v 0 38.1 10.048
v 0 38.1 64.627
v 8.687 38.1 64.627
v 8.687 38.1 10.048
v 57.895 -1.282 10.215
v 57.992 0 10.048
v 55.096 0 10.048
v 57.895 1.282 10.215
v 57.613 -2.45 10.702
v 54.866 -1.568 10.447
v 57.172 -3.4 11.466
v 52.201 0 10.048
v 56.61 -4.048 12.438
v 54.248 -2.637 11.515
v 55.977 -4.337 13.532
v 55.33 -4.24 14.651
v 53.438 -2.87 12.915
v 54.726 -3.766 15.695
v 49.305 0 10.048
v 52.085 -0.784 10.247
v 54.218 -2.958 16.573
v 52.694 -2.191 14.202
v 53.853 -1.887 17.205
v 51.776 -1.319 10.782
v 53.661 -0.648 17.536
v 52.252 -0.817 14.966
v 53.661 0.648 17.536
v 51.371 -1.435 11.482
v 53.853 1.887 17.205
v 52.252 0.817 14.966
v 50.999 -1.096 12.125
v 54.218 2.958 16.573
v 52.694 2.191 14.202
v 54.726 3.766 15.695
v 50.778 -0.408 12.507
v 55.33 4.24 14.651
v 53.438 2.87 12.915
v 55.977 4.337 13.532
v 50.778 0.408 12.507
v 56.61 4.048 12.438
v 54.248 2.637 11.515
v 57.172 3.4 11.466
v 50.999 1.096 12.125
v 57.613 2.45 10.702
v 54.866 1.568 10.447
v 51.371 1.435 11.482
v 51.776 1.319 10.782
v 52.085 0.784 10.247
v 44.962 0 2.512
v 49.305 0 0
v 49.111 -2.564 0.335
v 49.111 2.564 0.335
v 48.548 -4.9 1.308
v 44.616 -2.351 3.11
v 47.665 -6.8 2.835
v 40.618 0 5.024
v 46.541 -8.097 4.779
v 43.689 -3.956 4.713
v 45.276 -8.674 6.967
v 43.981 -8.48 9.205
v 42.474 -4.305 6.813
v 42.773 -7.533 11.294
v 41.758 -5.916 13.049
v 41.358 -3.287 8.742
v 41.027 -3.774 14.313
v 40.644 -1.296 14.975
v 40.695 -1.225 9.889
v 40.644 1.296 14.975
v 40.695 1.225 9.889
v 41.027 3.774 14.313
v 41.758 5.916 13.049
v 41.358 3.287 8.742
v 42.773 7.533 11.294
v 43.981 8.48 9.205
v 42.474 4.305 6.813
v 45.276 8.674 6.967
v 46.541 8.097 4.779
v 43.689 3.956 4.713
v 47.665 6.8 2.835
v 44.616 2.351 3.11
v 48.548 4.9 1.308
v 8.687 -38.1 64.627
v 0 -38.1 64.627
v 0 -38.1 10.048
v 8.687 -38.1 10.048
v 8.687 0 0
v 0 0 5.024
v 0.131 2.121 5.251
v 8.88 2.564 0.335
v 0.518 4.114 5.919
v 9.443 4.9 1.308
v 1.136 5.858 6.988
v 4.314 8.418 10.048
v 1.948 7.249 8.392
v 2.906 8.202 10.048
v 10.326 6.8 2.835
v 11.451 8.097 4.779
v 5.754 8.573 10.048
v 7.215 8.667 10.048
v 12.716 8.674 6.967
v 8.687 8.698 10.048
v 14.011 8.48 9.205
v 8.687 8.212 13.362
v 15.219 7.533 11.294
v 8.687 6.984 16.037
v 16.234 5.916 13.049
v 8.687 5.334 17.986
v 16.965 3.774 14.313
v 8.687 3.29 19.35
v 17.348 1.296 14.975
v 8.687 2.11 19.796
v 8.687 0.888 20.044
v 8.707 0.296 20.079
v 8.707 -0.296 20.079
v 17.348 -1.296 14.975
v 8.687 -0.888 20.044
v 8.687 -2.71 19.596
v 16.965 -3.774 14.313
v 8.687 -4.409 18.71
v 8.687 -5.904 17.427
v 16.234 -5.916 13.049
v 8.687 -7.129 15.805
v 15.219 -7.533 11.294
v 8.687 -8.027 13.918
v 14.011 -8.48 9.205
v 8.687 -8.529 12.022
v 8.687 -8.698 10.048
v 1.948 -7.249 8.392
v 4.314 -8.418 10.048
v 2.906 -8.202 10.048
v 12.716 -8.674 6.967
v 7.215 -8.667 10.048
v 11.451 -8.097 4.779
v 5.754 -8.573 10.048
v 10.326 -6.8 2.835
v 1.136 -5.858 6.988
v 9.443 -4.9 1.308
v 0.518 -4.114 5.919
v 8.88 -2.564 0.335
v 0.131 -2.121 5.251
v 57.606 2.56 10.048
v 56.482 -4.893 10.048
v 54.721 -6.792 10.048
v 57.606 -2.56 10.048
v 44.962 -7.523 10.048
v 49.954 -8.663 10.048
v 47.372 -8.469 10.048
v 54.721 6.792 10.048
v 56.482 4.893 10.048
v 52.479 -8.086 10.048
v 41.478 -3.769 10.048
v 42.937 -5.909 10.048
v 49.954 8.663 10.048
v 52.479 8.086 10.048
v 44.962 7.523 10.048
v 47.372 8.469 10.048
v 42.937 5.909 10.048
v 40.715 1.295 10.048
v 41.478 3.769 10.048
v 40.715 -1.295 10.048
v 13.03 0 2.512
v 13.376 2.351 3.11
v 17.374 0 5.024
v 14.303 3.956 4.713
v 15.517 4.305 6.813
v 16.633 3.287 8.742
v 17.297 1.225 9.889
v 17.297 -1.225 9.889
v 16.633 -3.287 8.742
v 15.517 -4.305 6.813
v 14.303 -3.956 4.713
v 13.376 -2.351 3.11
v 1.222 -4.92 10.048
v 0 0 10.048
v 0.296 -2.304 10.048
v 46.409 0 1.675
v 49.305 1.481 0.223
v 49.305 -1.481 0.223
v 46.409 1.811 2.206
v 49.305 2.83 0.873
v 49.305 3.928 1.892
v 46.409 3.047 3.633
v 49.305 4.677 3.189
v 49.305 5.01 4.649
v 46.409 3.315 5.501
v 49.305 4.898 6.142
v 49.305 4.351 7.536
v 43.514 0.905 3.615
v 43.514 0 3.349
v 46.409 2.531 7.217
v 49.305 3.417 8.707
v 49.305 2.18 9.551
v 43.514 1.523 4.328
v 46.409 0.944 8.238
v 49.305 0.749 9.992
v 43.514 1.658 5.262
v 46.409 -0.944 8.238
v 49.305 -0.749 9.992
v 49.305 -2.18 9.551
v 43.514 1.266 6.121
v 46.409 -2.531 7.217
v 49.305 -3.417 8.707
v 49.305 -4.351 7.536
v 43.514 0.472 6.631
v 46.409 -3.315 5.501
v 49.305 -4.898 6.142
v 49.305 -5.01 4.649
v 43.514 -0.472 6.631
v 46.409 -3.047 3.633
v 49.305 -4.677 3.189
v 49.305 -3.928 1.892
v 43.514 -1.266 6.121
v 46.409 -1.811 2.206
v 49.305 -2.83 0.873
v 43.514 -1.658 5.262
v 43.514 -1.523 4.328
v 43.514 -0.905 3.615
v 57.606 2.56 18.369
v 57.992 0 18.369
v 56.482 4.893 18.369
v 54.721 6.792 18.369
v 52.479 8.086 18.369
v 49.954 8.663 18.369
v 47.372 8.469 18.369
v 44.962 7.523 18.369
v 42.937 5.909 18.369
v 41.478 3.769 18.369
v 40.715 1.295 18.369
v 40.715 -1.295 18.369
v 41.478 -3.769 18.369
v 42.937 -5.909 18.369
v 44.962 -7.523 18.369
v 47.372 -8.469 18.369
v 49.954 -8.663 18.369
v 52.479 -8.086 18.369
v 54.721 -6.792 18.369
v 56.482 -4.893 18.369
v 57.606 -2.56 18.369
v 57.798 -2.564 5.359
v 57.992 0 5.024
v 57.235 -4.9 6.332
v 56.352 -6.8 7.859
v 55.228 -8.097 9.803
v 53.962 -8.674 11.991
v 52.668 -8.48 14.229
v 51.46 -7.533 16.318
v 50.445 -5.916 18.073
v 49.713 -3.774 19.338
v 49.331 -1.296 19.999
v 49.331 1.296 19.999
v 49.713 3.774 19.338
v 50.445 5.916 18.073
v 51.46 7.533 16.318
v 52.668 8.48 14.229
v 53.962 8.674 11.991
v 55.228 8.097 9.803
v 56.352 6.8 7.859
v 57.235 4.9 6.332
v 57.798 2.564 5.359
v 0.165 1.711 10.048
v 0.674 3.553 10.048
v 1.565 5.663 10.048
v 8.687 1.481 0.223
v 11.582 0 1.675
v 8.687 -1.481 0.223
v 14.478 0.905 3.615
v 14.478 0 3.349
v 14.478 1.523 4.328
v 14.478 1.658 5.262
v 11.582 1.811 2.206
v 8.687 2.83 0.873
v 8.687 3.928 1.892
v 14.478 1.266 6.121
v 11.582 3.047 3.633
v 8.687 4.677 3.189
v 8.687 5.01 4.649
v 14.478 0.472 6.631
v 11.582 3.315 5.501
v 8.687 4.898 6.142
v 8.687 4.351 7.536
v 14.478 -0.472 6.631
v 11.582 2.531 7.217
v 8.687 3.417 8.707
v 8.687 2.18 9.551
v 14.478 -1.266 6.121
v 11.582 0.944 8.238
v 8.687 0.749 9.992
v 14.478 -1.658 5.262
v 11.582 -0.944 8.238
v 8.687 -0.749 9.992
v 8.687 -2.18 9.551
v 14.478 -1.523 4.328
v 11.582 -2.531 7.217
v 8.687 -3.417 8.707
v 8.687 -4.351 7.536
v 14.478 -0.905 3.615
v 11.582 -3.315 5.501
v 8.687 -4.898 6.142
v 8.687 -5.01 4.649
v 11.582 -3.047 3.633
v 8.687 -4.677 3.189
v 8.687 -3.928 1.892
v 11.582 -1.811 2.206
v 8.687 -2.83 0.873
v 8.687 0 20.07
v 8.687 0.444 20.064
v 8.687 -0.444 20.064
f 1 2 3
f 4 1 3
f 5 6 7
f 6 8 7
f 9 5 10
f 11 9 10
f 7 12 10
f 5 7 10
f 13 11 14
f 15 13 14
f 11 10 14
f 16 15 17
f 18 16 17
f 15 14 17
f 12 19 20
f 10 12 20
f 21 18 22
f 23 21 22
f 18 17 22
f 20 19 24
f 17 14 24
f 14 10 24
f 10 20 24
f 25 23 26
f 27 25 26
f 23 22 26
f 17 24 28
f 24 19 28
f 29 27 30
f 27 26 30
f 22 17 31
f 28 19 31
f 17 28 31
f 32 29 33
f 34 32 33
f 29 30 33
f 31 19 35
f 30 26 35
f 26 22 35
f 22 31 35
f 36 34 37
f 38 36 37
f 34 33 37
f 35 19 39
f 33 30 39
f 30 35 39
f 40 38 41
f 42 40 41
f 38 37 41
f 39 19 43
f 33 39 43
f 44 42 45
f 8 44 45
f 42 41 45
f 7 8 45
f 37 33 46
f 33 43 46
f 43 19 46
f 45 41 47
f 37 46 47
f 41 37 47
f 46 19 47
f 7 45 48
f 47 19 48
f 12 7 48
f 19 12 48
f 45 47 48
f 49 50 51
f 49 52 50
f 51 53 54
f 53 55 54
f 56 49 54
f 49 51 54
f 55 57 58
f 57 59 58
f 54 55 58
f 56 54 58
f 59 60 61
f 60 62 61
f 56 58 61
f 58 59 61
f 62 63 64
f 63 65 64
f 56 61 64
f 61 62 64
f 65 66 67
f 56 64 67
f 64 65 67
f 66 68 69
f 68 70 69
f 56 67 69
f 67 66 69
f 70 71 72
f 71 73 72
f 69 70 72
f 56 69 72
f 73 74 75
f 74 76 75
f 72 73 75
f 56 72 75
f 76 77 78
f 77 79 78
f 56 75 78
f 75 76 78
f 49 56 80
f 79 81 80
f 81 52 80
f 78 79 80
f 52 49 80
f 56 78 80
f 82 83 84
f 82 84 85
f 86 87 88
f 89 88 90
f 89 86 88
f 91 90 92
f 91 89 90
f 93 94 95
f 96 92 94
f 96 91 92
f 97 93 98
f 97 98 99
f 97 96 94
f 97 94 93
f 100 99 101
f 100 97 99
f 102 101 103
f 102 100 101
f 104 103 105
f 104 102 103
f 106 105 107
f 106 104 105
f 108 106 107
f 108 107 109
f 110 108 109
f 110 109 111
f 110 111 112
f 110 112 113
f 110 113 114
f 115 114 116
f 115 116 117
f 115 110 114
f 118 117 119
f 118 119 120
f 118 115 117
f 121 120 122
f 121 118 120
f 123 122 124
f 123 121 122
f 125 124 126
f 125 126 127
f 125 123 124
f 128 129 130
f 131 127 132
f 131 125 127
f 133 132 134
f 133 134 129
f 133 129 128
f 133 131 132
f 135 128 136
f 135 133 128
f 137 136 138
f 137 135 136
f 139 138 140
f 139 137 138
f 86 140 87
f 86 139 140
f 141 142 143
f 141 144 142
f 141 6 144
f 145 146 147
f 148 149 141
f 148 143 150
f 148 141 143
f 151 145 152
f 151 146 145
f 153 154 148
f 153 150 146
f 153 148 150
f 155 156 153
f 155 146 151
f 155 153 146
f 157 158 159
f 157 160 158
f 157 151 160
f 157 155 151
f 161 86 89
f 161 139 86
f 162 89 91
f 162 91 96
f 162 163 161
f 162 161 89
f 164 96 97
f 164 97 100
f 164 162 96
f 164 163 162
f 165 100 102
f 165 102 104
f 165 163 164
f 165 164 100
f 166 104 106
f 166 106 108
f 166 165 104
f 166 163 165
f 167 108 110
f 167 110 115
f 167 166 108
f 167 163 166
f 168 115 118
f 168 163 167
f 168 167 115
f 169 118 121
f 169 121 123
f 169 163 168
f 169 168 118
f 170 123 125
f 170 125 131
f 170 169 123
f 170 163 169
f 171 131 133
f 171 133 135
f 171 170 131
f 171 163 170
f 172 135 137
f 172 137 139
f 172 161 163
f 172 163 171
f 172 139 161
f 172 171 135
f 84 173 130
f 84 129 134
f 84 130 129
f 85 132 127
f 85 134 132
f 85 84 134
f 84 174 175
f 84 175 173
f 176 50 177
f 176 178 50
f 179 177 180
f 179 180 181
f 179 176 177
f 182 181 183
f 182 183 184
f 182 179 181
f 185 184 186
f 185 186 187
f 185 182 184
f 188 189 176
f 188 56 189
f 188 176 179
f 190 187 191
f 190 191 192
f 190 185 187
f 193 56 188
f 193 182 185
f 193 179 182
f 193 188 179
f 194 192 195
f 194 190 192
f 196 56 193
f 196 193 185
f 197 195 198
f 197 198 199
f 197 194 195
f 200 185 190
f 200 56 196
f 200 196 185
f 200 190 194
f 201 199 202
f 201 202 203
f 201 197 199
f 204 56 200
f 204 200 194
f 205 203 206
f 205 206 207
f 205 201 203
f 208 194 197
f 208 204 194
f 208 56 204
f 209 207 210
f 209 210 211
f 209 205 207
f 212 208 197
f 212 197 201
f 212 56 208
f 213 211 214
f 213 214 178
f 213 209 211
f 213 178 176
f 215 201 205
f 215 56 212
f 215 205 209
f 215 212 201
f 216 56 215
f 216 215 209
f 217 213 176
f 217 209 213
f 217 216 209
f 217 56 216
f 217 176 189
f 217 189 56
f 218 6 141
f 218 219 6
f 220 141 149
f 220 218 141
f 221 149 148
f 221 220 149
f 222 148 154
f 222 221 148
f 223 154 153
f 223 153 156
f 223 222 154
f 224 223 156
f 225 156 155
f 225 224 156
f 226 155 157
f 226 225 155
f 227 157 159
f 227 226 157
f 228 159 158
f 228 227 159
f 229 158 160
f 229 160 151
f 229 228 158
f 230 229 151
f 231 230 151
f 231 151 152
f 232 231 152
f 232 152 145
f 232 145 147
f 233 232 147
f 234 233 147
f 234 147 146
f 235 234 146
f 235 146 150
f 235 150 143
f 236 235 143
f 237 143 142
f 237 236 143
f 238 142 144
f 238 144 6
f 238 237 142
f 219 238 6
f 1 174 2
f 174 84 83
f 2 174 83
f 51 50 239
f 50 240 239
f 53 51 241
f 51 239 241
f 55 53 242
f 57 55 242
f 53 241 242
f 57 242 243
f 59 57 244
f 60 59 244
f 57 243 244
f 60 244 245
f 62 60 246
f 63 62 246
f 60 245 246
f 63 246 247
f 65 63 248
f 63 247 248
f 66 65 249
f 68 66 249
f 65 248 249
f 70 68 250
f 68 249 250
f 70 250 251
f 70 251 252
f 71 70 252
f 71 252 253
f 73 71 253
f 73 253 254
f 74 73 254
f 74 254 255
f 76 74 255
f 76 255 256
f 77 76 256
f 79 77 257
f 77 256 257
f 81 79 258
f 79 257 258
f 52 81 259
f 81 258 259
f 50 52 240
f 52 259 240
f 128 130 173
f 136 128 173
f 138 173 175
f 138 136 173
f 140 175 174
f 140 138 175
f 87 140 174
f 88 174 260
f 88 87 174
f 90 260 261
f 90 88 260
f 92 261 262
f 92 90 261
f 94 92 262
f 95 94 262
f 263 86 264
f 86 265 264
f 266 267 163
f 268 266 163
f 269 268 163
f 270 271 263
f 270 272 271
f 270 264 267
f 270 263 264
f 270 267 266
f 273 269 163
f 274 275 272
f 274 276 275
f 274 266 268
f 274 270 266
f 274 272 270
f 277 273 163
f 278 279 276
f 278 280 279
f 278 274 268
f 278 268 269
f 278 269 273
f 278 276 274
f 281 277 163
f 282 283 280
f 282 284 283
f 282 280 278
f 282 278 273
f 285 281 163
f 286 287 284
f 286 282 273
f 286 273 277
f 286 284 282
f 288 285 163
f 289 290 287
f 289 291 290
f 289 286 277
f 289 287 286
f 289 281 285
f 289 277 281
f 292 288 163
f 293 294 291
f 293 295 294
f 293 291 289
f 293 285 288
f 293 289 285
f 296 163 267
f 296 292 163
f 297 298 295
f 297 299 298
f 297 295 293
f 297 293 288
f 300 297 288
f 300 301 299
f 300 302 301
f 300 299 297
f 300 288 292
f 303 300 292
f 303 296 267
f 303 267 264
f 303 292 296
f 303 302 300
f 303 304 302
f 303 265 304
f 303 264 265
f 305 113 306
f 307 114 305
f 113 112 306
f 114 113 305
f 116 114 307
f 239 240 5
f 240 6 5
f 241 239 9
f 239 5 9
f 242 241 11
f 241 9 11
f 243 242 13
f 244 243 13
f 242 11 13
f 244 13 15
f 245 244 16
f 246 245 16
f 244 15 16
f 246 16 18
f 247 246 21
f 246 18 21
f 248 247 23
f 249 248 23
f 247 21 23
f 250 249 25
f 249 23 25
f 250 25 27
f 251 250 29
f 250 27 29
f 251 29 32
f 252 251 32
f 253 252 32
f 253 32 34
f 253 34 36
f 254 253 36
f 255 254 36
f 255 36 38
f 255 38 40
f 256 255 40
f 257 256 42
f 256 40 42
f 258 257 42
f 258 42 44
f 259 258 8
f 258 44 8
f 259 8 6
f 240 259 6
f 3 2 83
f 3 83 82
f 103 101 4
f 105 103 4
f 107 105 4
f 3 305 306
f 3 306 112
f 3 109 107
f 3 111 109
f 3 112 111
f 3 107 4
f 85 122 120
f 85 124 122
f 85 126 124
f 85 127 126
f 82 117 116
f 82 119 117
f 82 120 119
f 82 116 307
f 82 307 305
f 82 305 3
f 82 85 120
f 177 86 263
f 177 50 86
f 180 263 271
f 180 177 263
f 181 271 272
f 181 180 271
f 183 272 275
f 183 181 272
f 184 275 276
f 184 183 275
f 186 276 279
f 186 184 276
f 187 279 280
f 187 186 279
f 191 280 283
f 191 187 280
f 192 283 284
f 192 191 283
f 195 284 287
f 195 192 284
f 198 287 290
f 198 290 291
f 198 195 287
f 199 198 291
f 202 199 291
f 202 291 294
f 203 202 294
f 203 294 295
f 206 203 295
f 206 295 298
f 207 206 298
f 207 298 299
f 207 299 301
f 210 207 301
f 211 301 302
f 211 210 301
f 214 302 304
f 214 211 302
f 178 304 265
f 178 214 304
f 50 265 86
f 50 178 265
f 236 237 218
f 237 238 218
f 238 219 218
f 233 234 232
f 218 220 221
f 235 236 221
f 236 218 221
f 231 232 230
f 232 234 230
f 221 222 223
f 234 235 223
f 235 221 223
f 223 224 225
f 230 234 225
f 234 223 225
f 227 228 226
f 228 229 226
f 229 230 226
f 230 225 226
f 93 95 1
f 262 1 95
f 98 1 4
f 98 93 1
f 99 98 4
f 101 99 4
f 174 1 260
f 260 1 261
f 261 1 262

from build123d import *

# Parameters (mm, degrees)
F0_W     = 8.6868
F0_H     = 8.3210518658
F0_H_2   = 54.579148829
F5_DEPTH = 38.1


with BuildPart() as f1:
    # F0 (on Front) → F1 (revolve)
    with BuildSketch(Plane.XZ):
        Polygon((0, 10.0481558442), (0, 5.0240779221), (8.6868, 10.0481558442), align=None)
        Polygon((8.6868, 10.0481558442), (8.6868, 5.0240779221), (17.3736, 5.0240779221), align=None)
        Polygon((8.6868, 10.0481558442), (0, 5.0240779221), (8.6868, 5.0240779221), align=None)
        Polygon((8.6868, 5.0240779221), (0, 5.0240779221), (8.6868, 0), align=None)
        Polygon((17.3736, 5.0240779221), (8.6868, 5.0240779221), (8.6868, 0), align=None)
    revolve(axis=Axis((13.0302, 0, 7.5361168832), (0.8656475241, 0, -0.5006539363)))

    # F0 (on Front) → F5 (join, symmetric)
    with BuildSketch(Plane.XZ):
        with Locations((4.3434, 37.3377302587)):
            Rectangle(F0_W, F0_H_2)
    extrude(amount=F5_DEPTH, both=True)


with BuildPart() as f2:
    # F0 (on Front) → F2 (revolve)
    with BuildSketch(Plane.XZ):
        Polygon((40.6181564641, 5.0240779221), (49.3049564641, 0), (49.3049564641, 5.0240779221), align=None)
        Polygon((49.3049564641, 10.0481558442), (40.6181564641, 5.0240779221), (49.3049564641, 5.0240779221), align=None)
        Polygon((49.3049564641, 5.0240779221), (49.3049564641, 0), (57.9917564641, 5.0240779221), (49.3049564641, 10.0481558442), align=None)
        Polygon((49.3049564641, 10.0481558442), (57.9917564641, 5.0240779221), (57.9917564641, 10.0481558442), align=None)
    revolve(axis=Axis((44.9615564641, 0, 7.5361168832), (-0.8656475241, 0, -0.5006539363)))


with BuildPart() as f3:
    # F0 (on Front) → F3 (revolve)
    with BuildSketch(Plane.XZ):
        Polygon((17.3736, 5.0240779221), (8.6868, 0), (49.3049564641, 0), (40.6181564641, 5.0240779221), align=None)
    revolve(axis=Axis((28.995878232, 0, 5.0240779221), (1, 0, 0)))


with BuildPart() as f4:
    # F0 (on Front) → F4 (revolve)
    with BuildSketch(Plane.XZ):
        with Locations((53.6483564641, 14.2086817771)):
            Rectangle(F0_W, F0_H)
    revolve(axis=Axis((49.3049564641, 0, 11.6966428161), (0, 0, 1)))


solid = Compound([f1.part, f2.part, f3.part, f4.part])
